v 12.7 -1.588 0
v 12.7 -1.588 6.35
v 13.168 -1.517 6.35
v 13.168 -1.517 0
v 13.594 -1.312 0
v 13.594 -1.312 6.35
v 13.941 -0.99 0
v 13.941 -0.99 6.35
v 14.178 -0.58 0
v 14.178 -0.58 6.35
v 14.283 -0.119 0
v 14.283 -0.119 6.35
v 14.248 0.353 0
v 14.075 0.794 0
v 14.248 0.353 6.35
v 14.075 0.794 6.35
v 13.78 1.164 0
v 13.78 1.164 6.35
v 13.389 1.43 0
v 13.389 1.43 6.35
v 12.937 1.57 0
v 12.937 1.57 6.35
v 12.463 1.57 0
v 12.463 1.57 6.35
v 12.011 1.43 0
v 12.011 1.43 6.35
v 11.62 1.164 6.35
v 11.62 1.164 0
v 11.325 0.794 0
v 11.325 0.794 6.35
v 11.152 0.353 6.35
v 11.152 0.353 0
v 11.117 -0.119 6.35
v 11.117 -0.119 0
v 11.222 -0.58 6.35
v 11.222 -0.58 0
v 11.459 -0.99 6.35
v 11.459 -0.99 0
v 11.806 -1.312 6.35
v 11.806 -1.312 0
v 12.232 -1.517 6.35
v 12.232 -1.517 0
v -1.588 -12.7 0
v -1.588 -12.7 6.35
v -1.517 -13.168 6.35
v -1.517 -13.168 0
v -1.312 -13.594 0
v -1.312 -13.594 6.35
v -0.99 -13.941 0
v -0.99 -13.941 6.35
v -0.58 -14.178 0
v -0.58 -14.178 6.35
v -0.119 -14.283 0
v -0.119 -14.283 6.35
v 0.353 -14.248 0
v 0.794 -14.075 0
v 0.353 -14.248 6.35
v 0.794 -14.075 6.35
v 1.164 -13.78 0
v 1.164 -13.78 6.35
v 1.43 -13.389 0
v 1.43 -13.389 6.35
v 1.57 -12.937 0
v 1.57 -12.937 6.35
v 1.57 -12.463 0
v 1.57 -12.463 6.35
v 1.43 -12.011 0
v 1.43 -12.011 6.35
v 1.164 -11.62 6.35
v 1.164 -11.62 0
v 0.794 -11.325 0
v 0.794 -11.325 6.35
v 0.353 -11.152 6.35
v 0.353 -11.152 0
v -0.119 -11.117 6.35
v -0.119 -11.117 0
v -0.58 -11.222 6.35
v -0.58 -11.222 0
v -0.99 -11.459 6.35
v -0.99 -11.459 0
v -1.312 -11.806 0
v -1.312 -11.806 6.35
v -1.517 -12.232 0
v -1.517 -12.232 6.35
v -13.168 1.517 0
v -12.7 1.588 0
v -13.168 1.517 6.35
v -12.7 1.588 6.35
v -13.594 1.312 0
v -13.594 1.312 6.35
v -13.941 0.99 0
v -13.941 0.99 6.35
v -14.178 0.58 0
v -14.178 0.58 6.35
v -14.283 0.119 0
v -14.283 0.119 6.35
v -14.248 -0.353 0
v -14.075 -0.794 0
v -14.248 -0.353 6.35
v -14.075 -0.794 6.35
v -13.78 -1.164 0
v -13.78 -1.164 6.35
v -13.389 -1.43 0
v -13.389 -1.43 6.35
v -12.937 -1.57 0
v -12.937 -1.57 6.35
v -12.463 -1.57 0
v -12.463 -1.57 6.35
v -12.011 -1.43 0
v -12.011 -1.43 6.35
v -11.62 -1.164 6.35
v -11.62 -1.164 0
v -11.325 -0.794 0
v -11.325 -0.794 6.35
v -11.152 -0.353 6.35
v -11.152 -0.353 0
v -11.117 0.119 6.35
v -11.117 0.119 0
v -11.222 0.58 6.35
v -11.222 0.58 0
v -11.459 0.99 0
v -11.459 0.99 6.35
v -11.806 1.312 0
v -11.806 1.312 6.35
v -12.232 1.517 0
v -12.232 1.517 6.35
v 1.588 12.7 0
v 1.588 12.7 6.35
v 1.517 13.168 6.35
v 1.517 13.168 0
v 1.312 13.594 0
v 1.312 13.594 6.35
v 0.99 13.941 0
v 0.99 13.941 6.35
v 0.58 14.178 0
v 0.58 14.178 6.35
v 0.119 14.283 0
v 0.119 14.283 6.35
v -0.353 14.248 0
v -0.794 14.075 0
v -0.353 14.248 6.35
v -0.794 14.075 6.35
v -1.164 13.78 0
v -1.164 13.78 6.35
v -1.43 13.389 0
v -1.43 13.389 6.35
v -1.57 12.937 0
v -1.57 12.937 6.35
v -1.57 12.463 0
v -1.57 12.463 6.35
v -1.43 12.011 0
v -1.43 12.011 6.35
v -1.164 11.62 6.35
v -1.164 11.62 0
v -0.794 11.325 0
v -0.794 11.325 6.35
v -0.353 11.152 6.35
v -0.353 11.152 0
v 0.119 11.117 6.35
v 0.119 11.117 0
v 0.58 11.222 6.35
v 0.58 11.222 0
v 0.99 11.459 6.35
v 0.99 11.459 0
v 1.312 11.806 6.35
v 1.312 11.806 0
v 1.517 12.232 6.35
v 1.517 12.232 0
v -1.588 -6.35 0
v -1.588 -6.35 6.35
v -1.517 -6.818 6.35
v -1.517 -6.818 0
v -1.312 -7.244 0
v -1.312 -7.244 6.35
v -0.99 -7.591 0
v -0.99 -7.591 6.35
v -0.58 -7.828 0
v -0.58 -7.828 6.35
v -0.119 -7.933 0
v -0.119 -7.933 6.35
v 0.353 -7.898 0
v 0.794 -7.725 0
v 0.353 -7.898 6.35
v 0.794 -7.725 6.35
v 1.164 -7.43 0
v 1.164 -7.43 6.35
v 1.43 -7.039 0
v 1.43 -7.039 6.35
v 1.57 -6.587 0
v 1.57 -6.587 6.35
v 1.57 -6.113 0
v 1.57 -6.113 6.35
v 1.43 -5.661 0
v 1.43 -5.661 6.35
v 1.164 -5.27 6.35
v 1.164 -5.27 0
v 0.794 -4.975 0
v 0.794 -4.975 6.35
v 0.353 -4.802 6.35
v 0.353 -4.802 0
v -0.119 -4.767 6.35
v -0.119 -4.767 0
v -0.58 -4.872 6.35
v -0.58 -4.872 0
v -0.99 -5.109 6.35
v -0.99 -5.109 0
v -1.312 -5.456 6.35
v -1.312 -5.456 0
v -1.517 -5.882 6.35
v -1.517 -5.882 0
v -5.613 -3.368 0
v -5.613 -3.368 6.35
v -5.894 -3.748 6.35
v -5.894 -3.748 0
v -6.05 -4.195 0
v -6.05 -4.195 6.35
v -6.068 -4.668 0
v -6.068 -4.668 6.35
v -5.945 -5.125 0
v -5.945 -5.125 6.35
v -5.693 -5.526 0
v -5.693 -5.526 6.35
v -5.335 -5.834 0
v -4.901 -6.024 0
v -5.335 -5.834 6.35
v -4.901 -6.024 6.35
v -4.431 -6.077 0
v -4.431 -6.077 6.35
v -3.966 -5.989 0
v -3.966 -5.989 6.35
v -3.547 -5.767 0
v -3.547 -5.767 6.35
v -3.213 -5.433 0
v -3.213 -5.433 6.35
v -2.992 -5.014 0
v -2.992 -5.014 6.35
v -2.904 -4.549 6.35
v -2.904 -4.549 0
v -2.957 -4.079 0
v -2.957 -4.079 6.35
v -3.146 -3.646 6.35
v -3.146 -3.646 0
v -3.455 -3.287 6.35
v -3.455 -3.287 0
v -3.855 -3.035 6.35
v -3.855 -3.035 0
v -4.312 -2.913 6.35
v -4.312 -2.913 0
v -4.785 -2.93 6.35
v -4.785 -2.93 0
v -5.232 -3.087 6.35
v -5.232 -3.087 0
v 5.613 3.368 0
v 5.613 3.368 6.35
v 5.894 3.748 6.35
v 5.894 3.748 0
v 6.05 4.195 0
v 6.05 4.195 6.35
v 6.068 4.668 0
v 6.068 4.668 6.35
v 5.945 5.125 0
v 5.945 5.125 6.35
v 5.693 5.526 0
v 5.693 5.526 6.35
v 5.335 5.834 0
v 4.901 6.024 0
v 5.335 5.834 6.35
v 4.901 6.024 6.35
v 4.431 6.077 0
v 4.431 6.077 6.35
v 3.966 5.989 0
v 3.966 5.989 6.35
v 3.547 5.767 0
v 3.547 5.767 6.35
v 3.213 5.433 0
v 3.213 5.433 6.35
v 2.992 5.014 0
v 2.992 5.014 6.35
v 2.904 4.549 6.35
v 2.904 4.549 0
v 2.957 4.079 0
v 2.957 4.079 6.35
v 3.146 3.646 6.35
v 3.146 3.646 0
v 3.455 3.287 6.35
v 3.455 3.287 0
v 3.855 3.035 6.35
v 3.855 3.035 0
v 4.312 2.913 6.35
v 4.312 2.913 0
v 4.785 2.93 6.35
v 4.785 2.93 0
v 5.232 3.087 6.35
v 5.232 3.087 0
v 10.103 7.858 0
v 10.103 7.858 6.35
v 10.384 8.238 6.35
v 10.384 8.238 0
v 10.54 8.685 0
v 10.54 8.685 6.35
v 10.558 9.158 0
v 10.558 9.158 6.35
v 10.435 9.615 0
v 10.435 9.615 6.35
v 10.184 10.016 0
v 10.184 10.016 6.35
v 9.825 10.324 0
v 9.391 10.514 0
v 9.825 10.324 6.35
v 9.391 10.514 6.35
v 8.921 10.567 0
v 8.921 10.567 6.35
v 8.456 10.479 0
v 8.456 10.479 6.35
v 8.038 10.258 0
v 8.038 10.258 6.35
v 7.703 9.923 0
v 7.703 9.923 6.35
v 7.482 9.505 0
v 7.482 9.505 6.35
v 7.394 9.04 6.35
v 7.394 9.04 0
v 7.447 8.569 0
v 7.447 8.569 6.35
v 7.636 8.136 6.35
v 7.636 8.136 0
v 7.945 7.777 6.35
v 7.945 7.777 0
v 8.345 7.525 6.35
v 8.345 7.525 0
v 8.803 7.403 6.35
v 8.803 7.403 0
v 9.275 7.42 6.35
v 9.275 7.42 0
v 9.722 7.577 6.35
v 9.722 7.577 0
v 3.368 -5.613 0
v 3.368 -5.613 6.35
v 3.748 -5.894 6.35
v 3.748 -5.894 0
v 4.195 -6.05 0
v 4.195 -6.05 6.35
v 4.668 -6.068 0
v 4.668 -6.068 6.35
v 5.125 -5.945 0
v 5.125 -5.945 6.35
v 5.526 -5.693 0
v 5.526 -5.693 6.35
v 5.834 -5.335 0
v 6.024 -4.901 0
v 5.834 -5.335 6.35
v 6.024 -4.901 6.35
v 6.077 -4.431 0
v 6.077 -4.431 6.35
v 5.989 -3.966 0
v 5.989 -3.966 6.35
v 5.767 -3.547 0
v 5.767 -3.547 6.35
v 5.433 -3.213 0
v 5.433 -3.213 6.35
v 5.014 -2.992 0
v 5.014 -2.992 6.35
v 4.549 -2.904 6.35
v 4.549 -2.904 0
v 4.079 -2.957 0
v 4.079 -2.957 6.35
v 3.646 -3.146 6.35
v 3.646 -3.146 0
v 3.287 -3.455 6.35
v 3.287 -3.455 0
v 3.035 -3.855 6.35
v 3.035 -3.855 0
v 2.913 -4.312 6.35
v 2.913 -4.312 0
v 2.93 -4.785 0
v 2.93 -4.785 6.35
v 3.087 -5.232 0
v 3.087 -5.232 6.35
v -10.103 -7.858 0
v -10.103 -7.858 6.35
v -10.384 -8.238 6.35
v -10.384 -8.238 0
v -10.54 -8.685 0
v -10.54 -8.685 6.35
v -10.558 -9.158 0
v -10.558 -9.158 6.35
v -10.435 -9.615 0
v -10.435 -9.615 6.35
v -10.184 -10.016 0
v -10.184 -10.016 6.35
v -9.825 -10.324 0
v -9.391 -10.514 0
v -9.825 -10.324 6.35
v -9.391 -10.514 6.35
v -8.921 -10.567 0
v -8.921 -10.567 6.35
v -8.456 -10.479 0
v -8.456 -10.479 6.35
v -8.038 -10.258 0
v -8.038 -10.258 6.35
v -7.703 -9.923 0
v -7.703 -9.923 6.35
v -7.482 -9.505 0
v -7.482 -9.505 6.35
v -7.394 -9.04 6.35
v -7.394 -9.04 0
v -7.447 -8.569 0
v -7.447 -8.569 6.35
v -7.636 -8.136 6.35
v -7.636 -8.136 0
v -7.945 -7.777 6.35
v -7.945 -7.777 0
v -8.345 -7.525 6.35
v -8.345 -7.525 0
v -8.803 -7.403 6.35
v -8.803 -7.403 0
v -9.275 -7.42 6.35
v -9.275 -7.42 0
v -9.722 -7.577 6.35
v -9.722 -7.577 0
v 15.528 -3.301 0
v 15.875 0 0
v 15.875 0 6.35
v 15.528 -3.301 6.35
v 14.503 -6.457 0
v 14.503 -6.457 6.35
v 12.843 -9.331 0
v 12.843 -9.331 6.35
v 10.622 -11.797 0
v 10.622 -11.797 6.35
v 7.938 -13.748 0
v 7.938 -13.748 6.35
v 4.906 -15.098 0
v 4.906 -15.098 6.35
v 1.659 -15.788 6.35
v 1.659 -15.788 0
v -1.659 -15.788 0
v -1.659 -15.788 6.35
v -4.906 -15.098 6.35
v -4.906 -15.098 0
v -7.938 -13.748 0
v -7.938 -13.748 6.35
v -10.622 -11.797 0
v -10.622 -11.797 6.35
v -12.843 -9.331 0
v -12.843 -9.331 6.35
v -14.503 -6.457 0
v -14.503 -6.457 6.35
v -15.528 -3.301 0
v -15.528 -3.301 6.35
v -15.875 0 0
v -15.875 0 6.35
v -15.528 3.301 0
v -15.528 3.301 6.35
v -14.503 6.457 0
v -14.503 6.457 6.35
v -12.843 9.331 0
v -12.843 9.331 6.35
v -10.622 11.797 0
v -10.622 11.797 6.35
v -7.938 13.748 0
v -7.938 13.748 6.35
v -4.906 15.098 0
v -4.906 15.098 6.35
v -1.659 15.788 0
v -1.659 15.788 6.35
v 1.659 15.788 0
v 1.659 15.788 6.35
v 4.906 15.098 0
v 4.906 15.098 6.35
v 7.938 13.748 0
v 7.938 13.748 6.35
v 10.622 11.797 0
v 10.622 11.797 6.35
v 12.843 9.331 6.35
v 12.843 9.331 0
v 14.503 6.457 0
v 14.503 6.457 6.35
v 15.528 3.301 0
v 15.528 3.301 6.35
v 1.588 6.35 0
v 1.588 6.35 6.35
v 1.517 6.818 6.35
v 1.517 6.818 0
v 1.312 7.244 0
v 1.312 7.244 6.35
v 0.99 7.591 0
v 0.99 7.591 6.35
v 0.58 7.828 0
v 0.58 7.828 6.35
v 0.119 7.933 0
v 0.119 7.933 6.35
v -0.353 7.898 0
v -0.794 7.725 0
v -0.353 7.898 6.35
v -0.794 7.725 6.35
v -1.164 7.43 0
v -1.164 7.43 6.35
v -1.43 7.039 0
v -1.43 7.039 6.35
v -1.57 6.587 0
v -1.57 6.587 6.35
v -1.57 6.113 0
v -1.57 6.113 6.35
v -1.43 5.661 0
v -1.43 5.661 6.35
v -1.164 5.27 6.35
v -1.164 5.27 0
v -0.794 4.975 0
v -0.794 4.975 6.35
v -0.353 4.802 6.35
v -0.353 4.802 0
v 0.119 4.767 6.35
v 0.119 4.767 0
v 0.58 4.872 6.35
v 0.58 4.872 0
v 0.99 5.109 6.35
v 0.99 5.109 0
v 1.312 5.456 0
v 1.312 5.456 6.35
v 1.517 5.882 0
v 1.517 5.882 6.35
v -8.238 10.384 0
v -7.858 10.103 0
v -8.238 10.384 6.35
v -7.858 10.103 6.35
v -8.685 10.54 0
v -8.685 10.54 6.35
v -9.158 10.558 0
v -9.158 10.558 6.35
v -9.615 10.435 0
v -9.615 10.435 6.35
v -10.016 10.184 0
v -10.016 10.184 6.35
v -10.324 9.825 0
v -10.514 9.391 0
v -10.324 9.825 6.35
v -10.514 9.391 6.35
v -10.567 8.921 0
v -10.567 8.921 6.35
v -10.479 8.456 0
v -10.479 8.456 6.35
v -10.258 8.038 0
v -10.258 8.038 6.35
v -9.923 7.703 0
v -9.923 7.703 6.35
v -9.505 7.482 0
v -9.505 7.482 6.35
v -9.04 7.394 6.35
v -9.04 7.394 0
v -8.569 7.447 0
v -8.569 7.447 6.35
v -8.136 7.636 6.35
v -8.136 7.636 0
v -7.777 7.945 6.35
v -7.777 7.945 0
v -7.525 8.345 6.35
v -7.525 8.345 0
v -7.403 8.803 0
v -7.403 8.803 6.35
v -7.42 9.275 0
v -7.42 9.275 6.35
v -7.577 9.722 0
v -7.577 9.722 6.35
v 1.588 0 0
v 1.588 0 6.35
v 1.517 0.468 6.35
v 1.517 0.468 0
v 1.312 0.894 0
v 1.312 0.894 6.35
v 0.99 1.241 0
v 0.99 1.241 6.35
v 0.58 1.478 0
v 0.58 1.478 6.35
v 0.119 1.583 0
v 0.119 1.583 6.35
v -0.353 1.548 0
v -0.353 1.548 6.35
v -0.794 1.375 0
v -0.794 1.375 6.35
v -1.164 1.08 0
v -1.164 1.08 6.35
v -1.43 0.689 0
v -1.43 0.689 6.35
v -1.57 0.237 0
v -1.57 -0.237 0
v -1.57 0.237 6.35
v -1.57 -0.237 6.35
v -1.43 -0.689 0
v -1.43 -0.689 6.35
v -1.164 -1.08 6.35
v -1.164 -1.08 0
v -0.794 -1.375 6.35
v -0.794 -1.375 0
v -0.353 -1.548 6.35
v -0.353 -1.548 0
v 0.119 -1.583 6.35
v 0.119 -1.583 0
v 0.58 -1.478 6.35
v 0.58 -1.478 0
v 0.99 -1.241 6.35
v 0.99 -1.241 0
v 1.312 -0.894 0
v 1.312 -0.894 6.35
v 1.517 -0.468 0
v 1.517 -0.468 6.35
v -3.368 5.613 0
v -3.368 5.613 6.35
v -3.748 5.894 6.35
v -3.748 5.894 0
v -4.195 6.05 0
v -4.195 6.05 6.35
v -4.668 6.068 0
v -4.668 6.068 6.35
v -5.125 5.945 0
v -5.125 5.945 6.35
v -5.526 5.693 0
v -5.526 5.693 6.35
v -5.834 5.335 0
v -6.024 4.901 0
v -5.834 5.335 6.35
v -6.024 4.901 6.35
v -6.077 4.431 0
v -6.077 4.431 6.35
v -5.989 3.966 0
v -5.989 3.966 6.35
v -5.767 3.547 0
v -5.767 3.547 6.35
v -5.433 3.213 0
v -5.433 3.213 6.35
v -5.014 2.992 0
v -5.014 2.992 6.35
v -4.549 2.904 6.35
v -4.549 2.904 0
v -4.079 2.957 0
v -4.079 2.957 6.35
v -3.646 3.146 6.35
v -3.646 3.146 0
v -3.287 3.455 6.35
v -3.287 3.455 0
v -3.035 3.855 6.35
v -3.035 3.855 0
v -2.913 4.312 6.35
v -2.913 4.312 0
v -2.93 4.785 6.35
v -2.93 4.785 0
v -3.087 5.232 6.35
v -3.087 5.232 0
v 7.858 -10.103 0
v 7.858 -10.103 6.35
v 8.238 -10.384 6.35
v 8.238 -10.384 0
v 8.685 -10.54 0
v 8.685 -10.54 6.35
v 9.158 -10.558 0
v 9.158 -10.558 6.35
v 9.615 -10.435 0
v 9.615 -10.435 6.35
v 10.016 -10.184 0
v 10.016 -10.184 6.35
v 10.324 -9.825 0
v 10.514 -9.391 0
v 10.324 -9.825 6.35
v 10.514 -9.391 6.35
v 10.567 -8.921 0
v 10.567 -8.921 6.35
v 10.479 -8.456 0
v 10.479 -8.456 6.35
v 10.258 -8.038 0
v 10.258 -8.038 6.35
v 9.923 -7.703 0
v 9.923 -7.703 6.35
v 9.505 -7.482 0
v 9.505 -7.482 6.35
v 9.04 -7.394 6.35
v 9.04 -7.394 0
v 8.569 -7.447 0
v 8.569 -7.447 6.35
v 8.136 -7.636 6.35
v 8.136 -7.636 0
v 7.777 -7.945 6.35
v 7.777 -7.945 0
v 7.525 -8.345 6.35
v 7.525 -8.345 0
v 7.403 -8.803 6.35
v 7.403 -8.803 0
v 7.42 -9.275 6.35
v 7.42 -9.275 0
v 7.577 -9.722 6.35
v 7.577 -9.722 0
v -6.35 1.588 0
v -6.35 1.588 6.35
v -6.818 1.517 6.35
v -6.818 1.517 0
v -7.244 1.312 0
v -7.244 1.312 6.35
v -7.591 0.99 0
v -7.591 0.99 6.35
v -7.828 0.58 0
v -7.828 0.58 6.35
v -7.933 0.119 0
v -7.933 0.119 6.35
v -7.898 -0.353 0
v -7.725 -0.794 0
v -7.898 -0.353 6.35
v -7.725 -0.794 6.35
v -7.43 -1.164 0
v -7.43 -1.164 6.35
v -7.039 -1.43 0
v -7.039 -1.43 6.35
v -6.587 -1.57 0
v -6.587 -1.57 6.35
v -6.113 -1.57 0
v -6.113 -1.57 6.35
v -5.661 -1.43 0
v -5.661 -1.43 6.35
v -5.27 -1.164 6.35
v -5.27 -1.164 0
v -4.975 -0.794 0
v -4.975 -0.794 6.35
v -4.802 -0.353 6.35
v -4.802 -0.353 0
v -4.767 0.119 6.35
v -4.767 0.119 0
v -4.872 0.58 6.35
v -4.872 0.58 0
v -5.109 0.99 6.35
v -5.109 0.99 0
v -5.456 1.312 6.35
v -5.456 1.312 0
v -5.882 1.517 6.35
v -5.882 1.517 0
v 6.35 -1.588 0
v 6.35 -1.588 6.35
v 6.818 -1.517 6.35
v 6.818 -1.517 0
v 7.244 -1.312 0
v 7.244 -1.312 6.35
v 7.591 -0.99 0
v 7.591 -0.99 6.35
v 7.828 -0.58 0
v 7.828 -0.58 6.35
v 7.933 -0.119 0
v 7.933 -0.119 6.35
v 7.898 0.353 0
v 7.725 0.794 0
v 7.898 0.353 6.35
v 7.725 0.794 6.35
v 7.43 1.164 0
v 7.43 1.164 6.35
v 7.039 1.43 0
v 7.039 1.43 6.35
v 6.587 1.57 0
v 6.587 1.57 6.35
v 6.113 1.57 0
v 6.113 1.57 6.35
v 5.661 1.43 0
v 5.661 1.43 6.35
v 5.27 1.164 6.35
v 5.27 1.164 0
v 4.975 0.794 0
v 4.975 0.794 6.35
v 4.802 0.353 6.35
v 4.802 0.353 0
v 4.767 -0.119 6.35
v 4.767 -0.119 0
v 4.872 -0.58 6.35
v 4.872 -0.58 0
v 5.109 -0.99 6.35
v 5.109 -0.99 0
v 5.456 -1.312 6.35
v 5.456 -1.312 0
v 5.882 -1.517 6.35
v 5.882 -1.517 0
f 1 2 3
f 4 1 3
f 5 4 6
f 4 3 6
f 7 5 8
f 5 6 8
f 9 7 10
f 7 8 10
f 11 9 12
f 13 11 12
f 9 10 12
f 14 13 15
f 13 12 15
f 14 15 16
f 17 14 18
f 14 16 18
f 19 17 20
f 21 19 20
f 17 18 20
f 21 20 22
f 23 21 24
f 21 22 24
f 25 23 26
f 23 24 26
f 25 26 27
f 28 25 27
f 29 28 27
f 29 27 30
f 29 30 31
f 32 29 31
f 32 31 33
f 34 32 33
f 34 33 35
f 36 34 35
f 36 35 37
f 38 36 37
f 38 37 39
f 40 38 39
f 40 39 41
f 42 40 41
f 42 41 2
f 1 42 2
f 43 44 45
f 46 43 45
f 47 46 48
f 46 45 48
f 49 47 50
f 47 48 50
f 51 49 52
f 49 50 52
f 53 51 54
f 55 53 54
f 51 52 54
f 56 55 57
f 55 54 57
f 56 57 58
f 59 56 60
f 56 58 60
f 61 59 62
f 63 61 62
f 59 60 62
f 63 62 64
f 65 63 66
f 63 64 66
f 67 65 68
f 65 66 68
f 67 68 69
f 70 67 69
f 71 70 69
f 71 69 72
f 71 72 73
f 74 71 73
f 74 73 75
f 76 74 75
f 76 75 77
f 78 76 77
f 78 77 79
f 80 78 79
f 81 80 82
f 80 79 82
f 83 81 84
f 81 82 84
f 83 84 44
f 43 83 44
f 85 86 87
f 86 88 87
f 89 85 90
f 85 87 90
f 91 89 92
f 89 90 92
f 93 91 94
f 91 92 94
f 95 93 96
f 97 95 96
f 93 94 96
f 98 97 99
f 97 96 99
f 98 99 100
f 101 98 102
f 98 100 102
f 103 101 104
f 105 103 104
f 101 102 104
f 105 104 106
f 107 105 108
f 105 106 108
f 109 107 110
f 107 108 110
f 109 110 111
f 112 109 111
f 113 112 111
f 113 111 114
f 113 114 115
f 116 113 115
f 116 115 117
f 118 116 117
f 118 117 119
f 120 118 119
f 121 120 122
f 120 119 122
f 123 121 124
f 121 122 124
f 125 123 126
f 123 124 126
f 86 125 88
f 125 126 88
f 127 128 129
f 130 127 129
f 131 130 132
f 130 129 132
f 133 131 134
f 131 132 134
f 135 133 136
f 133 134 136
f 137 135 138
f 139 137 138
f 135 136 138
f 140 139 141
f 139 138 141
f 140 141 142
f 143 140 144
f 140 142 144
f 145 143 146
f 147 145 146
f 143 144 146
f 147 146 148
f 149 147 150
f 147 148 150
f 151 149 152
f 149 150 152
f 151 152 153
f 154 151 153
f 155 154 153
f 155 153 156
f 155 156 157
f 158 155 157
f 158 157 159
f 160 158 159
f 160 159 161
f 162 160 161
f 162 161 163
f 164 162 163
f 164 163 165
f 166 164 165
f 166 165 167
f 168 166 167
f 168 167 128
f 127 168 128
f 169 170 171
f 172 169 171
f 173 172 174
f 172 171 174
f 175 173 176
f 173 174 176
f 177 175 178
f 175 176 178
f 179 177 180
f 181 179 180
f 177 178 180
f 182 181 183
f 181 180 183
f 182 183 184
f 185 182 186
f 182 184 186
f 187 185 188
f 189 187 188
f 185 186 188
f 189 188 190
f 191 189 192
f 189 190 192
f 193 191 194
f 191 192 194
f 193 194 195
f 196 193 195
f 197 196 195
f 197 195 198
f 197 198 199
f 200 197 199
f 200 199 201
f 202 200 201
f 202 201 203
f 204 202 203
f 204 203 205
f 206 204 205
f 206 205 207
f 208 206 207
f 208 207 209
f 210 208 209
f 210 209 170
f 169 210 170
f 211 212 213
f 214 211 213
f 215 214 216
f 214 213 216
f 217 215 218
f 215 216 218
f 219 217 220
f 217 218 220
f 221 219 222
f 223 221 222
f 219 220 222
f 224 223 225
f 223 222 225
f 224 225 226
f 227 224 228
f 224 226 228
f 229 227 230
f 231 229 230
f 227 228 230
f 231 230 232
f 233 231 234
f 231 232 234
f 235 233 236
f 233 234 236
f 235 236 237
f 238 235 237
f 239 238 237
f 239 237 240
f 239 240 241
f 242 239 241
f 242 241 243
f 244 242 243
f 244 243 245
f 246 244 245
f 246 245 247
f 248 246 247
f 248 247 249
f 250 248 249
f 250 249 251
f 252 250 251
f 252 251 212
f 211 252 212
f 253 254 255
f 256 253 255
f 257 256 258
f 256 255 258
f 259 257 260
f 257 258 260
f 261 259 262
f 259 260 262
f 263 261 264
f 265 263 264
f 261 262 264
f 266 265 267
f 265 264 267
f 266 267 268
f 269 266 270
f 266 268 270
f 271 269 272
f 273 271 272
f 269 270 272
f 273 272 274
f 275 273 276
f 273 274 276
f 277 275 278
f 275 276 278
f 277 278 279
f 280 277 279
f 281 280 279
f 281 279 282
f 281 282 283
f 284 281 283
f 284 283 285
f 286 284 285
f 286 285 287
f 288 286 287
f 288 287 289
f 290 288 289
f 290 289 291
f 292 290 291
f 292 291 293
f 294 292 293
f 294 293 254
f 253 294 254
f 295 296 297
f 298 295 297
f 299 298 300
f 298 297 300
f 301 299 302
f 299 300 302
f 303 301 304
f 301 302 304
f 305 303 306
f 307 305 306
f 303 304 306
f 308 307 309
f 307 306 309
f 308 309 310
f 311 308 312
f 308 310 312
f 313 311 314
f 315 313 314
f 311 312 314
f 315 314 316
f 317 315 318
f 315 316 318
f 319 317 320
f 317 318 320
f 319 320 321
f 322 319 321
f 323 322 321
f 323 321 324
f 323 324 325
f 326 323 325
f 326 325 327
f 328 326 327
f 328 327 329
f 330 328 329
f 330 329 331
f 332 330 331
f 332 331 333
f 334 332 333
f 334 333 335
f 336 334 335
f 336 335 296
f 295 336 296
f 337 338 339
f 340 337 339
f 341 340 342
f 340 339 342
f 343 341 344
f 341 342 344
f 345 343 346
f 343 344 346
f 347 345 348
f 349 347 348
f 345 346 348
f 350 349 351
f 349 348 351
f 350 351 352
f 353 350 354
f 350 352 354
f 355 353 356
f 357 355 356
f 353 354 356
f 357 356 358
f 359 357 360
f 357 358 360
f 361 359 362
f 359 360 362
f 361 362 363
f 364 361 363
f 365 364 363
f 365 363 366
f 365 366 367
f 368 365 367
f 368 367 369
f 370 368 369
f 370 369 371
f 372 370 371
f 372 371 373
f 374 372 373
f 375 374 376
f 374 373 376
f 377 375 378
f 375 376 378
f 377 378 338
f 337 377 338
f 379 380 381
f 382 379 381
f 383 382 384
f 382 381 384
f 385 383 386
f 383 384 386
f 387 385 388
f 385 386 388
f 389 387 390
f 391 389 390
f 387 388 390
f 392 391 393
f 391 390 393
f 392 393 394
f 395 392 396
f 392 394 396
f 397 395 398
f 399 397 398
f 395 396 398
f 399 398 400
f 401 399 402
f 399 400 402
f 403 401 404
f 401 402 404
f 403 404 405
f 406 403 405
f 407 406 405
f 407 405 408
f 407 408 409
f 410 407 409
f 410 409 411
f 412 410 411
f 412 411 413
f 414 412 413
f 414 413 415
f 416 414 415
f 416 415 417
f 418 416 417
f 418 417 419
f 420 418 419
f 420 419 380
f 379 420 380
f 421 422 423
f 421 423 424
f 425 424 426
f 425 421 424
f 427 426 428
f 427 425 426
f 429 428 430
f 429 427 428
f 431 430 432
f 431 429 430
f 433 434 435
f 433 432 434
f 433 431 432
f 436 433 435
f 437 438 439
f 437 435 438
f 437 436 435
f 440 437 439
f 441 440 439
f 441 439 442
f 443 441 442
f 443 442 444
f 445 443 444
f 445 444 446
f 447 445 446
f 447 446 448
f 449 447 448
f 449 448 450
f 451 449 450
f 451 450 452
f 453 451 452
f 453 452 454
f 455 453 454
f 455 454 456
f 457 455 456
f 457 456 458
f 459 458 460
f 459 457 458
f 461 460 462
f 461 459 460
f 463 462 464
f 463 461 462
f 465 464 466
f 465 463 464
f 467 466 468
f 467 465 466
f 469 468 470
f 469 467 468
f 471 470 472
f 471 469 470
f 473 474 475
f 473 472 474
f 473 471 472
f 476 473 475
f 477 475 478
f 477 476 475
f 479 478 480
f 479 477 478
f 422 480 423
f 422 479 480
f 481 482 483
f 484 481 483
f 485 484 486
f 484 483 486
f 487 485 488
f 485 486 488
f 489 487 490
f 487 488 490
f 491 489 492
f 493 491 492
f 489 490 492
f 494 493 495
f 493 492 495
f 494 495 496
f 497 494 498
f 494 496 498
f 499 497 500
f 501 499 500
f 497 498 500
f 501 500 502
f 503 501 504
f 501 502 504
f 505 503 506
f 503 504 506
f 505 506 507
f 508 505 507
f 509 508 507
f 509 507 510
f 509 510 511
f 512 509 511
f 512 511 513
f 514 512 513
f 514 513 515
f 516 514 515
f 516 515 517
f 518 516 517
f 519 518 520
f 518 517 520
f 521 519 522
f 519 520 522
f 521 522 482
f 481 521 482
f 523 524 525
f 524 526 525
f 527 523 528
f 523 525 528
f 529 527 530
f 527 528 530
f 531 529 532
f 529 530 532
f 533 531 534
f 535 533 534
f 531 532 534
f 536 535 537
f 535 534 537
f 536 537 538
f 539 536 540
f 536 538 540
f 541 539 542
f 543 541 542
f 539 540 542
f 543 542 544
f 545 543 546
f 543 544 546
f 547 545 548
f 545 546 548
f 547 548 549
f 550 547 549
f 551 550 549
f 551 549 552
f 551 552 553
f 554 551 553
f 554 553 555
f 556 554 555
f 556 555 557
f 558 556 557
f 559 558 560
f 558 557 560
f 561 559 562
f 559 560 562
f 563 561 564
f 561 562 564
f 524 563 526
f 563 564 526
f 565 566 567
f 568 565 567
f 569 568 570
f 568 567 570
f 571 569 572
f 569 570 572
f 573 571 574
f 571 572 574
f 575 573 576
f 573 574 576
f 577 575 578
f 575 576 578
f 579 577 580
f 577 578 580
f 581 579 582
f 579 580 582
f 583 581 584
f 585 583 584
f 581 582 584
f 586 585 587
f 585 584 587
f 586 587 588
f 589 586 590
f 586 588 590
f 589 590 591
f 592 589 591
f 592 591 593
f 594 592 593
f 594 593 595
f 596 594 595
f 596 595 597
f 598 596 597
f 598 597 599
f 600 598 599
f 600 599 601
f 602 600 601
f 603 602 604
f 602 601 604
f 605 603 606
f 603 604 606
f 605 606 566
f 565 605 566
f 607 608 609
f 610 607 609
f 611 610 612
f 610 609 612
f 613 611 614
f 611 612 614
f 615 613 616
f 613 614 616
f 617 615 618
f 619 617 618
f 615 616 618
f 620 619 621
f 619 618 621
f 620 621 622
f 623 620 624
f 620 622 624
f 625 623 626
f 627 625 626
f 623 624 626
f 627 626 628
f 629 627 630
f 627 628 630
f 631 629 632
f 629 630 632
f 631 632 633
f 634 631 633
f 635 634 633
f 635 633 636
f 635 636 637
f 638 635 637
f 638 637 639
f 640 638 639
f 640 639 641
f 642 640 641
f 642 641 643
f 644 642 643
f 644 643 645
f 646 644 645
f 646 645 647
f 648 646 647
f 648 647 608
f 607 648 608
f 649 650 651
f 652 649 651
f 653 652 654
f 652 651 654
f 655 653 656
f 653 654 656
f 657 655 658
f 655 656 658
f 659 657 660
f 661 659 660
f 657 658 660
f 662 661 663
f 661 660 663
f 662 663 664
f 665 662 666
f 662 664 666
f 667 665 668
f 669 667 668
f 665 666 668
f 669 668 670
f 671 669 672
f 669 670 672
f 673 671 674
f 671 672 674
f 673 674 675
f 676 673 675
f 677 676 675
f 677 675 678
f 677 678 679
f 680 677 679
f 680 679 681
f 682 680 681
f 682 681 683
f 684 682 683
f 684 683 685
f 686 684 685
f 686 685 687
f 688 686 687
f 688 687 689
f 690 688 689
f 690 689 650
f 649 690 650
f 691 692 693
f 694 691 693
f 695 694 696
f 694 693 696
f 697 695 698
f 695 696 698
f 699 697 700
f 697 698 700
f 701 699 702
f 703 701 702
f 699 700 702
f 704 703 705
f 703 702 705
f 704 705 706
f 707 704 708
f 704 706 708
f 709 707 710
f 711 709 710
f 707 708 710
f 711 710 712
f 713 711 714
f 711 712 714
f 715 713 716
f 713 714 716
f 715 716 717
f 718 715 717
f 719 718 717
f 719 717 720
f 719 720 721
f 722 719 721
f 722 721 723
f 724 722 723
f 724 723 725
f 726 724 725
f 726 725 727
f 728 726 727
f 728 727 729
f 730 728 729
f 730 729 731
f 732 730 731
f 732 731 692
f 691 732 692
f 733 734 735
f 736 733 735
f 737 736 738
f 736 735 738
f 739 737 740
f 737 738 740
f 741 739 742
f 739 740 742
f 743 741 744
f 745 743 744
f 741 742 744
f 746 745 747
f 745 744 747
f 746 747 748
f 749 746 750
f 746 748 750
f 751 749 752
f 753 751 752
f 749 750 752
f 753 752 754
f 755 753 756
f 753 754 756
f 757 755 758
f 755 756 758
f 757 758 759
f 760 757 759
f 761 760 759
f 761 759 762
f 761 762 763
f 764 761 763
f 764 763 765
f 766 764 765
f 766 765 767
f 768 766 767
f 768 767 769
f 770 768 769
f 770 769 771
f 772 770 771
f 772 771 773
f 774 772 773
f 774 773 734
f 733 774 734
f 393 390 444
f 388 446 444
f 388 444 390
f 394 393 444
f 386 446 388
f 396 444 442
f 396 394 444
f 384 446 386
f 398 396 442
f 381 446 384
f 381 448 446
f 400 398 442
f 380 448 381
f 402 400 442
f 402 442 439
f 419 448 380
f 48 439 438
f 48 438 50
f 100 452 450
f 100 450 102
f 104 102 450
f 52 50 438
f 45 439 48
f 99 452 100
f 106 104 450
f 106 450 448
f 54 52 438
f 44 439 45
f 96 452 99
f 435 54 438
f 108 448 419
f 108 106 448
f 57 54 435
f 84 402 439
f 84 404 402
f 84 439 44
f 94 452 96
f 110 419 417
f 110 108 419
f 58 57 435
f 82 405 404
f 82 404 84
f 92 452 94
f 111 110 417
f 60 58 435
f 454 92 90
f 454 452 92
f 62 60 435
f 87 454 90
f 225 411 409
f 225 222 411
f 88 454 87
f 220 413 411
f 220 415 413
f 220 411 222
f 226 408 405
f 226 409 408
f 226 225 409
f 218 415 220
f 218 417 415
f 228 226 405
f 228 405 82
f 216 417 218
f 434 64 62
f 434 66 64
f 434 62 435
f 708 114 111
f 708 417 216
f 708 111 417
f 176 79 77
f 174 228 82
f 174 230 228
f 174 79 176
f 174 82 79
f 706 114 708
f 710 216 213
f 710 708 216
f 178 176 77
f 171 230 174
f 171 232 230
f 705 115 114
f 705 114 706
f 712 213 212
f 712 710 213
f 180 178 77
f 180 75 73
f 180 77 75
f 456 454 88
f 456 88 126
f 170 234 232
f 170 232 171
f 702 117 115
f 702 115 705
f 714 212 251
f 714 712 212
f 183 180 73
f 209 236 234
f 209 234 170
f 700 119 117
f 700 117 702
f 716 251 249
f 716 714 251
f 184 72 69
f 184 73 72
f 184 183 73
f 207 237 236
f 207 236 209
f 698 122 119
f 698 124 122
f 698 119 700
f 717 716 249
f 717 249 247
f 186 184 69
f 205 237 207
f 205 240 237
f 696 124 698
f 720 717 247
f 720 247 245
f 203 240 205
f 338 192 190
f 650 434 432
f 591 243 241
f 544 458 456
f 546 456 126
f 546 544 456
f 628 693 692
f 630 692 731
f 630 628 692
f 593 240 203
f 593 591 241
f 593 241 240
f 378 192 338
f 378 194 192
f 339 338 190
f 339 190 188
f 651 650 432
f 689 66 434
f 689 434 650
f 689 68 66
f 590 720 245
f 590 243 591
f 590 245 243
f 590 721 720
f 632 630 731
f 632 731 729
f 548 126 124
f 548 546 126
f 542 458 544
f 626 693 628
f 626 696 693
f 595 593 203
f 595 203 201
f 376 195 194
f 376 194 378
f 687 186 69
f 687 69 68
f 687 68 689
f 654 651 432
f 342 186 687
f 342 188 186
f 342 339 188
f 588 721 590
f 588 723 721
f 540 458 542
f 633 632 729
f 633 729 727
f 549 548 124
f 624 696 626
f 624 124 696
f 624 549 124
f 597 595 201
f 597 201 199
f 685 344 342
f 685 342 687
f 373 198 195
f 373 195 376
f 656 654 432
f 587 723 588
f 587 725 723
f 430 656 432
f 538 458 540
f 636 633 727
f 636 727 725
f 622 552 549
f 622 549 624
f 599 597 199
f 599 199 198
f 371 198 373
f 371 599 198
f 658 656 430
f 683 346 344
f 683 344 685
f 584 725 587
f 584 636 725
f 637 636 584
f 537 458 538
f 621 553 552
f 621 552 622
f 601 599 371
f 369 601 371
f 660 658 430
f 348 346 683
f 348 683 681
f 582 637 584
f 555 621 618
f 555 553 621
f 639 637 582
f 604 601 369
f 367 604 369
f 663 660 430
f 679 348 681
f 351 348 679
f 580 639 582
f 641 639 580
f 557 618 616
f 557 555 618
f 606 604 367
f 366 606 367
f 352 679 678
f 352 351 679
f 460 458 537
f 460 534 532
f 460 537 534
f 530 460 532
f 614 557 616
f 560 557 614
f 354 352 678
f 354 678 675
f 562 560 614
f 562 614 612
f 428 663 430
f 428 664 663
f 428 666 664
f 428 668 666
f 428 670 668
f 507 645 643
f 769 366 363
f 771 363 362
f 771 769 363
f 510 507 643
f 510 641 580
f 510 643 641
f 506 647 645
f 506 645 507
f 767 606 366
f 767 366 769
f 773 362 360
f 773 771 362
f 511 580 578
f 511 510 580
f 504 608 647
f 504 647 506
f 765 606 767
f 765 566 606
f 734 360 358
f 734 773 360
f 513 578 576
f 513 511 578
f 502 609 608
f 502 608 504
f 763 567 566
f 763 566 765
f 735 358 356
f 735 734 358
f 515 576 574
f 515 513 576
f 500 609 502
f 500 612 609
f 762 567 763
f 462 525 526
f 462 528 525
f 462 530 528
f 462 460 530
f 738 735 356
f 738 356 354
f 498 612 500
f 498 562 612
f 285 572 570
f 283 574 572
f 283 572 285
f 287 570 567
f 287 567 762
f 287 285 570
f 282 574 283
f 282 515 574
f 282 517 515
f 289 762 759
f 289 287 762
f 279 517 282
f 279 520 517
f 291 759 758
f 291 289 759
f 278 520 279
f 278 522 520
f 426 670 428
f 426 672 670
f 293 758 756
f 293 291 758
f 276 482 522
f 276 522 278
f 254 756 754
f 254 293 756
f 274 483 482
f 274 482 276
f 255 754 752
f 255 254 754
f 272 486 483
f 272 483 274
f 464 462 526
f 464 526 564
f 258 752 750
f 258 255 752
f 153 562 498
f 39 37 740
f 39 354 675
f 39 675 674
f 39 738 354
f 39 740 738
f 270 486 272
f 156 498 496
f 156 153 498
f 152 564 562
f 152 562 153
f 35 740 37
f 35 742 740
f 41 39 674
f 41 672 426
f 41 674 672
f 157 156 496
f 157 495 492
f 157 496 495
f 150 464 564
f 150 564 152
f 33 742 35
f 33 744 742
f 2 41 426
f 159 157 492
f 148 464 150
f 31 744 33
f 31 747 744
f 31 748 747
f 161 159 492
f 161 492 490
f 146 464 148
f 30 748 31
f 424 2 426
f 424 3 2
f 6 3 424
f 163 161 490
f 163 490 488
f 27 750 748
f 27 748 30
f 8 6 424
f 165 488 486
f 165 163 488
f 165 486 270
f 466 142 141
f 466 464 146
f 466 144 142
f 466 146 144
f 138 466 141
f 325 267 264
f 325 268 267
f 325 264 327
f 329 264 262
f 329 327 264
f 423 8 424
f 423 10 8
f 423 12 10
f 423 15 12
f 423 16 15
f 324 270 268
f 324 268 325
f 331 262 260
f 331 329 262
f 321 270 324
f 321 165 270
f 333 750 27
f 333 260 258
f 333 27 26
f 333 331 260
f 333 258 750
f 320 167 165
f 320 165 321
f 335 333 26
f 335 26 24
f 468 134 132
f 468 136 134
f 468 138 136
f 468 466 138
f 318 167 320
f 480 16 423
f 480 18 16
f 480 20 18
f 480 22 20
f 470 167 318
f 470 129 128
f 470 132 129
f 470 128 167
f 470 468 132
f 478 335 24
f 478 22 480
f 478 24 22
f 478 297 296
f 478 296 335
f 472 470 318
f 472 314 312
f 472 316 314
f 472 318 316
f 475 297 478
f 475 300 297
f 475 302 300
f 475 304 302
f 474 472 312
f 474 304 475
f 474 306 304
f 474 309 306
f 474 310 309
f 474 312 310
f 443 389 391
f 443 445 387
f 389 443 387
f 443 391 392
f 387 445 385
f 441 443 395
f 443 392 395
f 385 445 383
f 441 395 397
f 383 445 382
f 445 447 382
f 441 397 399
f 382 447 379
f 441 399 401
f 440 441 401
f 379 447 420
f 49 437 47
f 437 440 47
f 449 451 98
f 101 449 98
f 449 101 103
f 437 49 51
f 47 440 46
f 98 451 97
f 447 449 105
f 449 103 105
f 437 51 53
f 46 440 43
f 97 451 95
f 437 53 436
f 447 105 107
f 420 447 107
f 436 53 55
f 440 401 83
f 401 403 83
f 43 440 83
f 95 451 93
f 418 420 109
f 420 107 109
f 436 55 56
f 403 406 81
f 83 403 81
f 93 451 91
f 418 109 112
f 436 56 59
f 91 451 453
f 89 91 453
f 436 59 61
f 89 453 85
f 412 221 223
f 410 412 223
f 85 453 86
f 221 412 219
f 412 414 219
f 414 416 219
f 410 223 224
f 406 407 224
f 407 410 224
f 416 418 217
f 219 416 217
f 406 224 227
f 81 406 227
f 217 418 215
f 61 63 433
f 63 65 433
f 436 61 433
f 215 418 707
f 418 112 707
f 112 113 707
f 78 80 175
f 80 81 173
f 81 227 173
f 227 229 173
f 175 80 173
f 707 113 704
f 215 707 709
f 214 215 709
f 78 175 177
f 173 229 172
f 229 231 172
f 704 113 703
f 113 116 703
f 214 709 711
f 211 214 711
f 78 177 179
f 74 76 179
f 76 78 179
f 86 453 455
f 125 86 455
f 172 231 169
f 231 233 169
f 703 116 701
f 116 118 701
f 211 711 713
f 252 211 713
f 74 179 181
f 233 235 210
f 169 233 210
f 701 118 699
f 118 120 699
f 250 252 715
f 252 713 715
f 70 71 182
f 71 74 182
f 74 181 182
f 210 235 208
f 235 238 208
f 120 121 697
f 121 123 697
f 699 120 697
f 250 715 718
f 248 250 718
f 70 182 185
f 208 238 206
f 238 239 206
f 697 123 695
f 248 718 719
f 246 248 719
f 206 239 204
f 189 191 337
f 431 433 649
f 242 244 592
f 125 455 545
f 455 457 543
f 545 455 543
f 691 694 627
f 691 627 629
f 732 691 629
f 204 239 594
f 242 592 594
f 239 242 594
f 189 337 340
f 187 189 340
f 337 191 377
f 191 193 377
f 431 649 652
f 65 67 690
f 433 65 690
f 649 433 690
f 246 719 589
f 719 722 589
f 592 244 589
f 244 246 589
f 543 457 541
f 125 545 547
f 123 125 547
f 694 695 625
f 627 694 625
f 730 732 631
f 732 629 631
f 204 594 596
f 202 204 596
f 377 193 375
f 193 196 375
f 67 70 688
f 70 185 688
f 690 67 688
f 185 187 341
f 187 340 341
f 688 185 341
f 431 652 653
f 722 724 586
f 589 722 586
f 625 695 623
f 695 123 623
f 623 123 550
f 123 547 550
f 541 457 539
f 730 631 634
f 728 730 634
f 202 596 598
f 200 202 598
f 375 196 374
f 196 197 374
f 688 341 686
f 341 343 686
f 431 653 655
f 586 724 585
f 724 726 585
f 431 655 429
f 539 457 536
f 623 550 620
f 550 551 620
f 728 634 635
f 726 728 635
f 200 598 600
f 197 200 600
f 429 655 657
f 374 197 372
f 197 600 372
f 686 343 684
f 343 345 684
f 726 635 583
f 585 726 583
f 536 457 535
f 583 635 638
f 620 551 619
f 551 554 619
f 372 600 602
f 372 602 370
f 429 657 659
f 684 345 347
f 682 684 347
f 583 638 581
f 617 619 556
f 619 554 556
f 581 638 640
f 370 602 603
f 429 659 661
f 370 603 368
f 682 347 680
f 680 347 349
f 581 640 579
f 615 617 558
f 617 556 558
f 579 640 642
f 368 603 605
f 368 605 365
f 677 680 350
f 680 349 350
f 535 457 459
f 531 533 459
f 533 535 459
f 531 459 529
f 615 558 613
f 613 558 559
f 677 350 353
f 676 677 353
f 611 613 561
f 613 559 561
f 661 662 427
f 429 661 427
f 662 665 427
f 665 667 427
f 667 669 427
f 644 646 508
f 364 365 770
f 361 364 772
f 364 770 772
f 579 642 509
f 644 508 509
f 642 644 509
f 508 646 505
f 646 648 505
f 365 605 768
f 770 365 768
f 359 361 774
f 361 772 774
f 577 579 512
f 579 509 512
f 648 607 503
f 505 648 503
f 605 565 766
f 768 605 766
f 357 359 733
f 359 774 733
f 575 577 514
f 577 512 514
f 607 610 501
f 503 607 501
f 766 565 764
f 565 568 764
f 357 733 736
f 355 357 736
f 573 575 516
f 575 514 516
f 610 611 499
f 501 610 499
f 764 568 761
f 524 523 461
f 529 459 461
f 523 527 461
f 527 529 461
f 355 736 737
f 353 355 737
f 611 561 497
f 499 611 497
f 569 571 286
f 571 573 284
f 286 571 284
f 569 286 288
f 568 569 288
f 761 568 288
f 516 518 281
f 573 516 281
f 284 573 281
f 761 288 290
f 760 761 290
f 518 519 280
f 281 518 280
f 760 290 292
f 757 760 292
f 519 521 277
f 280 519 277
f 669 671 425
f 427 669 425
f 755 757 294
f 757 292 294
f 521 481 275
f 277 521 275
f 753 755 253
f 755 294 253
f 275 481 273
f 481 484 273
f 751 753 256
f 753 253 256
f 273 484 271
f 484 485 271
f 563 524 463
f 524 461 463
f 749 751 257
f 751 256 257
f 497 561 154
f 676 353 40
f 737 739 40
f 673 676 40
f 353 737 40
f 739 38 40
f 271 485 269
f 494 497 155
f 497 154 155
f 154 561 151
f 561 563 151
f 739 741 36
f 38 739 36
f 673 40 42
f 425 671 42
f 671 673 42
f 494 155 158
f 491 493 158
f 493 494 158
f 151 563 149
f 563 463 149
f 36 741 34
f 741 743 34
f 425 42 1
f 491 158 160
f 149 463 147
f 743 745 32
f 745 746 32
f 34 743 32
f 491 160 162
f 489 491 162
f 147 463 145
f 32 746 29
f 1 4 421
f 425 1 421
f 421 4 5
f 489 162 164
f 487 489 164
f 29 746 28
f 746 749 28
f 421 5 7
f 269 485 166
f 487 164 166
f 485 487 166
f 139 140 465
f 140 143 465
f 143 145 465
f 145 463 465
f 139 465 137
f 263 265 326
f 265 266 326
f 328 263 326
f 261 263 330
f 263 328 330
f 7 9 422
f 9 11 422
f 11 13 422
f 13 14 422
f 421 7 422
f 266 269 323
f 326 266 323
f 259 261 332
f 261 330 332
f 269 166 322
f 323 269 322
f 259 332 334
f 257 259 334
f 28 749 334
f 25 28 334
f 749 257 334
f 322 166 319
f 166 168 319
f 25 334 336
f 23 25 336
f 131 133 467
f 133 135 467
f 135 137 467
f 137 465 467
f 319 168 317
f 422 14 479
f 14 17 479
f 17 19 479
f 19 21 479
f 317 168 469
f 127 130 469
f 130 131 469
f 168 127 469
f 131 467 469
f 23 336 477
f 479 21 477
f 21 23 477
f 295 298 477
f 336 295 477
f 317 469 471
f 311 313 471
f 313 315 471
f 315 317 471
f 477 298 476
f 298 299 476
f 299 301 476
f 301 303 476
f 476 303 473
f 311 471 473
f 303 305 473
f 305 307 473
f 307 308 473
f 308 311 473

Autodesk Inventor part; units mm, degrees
ref_plane "YZ Plane" through (0, 0, 0) normal (1, 0, 0) x (0, 1, 0)
ref_plane "XZ Plane" through (0, 0, 0) normal (0, 1, 0) x (-1, 0, 0)
ref_plane "XY Plane" through (0, 0, 0) normal (0, 0, 1) x (1, 0, 0)
sketch "Sketch1" plane through (0, 0, 0) normal (0, 0, 1) x (1, 0, 0)
  circle A0 centre (0, 0) radius 15.875 projected
extrude "Extrusion1" add sketch "Sketch1" along normal blind 6.35
sketch "Sketch3" plane through (0, 0, 6.35) normal (0, 0, 1) x (1, 0, 0)
  circle A0 centre (0, 0) radius 15.875 projected
  circle A1 centre (0, 12.7) radius 1.5875
  circle A2 centre (0, 6.35) radius 1.5875
  circle A3 centre (0, 0) radius 1.5875
  dimension "d4" = 3.175
  dimension "d5" = 3.175
  dimension "d6" = 3.175
  dimension "d7" = 6.35
  dimension "d8" = 6.35
extrude "Extrusion3" cut sketch "Sketch3" against normal blind 6.35 contours A1 | A2 | A3
pattern_circular "Circular Pattern1" count 8 over 360 about axis through (0, 0, 0) along (0, 0, 1) of "Extrusion3"
properties part number "lid"
